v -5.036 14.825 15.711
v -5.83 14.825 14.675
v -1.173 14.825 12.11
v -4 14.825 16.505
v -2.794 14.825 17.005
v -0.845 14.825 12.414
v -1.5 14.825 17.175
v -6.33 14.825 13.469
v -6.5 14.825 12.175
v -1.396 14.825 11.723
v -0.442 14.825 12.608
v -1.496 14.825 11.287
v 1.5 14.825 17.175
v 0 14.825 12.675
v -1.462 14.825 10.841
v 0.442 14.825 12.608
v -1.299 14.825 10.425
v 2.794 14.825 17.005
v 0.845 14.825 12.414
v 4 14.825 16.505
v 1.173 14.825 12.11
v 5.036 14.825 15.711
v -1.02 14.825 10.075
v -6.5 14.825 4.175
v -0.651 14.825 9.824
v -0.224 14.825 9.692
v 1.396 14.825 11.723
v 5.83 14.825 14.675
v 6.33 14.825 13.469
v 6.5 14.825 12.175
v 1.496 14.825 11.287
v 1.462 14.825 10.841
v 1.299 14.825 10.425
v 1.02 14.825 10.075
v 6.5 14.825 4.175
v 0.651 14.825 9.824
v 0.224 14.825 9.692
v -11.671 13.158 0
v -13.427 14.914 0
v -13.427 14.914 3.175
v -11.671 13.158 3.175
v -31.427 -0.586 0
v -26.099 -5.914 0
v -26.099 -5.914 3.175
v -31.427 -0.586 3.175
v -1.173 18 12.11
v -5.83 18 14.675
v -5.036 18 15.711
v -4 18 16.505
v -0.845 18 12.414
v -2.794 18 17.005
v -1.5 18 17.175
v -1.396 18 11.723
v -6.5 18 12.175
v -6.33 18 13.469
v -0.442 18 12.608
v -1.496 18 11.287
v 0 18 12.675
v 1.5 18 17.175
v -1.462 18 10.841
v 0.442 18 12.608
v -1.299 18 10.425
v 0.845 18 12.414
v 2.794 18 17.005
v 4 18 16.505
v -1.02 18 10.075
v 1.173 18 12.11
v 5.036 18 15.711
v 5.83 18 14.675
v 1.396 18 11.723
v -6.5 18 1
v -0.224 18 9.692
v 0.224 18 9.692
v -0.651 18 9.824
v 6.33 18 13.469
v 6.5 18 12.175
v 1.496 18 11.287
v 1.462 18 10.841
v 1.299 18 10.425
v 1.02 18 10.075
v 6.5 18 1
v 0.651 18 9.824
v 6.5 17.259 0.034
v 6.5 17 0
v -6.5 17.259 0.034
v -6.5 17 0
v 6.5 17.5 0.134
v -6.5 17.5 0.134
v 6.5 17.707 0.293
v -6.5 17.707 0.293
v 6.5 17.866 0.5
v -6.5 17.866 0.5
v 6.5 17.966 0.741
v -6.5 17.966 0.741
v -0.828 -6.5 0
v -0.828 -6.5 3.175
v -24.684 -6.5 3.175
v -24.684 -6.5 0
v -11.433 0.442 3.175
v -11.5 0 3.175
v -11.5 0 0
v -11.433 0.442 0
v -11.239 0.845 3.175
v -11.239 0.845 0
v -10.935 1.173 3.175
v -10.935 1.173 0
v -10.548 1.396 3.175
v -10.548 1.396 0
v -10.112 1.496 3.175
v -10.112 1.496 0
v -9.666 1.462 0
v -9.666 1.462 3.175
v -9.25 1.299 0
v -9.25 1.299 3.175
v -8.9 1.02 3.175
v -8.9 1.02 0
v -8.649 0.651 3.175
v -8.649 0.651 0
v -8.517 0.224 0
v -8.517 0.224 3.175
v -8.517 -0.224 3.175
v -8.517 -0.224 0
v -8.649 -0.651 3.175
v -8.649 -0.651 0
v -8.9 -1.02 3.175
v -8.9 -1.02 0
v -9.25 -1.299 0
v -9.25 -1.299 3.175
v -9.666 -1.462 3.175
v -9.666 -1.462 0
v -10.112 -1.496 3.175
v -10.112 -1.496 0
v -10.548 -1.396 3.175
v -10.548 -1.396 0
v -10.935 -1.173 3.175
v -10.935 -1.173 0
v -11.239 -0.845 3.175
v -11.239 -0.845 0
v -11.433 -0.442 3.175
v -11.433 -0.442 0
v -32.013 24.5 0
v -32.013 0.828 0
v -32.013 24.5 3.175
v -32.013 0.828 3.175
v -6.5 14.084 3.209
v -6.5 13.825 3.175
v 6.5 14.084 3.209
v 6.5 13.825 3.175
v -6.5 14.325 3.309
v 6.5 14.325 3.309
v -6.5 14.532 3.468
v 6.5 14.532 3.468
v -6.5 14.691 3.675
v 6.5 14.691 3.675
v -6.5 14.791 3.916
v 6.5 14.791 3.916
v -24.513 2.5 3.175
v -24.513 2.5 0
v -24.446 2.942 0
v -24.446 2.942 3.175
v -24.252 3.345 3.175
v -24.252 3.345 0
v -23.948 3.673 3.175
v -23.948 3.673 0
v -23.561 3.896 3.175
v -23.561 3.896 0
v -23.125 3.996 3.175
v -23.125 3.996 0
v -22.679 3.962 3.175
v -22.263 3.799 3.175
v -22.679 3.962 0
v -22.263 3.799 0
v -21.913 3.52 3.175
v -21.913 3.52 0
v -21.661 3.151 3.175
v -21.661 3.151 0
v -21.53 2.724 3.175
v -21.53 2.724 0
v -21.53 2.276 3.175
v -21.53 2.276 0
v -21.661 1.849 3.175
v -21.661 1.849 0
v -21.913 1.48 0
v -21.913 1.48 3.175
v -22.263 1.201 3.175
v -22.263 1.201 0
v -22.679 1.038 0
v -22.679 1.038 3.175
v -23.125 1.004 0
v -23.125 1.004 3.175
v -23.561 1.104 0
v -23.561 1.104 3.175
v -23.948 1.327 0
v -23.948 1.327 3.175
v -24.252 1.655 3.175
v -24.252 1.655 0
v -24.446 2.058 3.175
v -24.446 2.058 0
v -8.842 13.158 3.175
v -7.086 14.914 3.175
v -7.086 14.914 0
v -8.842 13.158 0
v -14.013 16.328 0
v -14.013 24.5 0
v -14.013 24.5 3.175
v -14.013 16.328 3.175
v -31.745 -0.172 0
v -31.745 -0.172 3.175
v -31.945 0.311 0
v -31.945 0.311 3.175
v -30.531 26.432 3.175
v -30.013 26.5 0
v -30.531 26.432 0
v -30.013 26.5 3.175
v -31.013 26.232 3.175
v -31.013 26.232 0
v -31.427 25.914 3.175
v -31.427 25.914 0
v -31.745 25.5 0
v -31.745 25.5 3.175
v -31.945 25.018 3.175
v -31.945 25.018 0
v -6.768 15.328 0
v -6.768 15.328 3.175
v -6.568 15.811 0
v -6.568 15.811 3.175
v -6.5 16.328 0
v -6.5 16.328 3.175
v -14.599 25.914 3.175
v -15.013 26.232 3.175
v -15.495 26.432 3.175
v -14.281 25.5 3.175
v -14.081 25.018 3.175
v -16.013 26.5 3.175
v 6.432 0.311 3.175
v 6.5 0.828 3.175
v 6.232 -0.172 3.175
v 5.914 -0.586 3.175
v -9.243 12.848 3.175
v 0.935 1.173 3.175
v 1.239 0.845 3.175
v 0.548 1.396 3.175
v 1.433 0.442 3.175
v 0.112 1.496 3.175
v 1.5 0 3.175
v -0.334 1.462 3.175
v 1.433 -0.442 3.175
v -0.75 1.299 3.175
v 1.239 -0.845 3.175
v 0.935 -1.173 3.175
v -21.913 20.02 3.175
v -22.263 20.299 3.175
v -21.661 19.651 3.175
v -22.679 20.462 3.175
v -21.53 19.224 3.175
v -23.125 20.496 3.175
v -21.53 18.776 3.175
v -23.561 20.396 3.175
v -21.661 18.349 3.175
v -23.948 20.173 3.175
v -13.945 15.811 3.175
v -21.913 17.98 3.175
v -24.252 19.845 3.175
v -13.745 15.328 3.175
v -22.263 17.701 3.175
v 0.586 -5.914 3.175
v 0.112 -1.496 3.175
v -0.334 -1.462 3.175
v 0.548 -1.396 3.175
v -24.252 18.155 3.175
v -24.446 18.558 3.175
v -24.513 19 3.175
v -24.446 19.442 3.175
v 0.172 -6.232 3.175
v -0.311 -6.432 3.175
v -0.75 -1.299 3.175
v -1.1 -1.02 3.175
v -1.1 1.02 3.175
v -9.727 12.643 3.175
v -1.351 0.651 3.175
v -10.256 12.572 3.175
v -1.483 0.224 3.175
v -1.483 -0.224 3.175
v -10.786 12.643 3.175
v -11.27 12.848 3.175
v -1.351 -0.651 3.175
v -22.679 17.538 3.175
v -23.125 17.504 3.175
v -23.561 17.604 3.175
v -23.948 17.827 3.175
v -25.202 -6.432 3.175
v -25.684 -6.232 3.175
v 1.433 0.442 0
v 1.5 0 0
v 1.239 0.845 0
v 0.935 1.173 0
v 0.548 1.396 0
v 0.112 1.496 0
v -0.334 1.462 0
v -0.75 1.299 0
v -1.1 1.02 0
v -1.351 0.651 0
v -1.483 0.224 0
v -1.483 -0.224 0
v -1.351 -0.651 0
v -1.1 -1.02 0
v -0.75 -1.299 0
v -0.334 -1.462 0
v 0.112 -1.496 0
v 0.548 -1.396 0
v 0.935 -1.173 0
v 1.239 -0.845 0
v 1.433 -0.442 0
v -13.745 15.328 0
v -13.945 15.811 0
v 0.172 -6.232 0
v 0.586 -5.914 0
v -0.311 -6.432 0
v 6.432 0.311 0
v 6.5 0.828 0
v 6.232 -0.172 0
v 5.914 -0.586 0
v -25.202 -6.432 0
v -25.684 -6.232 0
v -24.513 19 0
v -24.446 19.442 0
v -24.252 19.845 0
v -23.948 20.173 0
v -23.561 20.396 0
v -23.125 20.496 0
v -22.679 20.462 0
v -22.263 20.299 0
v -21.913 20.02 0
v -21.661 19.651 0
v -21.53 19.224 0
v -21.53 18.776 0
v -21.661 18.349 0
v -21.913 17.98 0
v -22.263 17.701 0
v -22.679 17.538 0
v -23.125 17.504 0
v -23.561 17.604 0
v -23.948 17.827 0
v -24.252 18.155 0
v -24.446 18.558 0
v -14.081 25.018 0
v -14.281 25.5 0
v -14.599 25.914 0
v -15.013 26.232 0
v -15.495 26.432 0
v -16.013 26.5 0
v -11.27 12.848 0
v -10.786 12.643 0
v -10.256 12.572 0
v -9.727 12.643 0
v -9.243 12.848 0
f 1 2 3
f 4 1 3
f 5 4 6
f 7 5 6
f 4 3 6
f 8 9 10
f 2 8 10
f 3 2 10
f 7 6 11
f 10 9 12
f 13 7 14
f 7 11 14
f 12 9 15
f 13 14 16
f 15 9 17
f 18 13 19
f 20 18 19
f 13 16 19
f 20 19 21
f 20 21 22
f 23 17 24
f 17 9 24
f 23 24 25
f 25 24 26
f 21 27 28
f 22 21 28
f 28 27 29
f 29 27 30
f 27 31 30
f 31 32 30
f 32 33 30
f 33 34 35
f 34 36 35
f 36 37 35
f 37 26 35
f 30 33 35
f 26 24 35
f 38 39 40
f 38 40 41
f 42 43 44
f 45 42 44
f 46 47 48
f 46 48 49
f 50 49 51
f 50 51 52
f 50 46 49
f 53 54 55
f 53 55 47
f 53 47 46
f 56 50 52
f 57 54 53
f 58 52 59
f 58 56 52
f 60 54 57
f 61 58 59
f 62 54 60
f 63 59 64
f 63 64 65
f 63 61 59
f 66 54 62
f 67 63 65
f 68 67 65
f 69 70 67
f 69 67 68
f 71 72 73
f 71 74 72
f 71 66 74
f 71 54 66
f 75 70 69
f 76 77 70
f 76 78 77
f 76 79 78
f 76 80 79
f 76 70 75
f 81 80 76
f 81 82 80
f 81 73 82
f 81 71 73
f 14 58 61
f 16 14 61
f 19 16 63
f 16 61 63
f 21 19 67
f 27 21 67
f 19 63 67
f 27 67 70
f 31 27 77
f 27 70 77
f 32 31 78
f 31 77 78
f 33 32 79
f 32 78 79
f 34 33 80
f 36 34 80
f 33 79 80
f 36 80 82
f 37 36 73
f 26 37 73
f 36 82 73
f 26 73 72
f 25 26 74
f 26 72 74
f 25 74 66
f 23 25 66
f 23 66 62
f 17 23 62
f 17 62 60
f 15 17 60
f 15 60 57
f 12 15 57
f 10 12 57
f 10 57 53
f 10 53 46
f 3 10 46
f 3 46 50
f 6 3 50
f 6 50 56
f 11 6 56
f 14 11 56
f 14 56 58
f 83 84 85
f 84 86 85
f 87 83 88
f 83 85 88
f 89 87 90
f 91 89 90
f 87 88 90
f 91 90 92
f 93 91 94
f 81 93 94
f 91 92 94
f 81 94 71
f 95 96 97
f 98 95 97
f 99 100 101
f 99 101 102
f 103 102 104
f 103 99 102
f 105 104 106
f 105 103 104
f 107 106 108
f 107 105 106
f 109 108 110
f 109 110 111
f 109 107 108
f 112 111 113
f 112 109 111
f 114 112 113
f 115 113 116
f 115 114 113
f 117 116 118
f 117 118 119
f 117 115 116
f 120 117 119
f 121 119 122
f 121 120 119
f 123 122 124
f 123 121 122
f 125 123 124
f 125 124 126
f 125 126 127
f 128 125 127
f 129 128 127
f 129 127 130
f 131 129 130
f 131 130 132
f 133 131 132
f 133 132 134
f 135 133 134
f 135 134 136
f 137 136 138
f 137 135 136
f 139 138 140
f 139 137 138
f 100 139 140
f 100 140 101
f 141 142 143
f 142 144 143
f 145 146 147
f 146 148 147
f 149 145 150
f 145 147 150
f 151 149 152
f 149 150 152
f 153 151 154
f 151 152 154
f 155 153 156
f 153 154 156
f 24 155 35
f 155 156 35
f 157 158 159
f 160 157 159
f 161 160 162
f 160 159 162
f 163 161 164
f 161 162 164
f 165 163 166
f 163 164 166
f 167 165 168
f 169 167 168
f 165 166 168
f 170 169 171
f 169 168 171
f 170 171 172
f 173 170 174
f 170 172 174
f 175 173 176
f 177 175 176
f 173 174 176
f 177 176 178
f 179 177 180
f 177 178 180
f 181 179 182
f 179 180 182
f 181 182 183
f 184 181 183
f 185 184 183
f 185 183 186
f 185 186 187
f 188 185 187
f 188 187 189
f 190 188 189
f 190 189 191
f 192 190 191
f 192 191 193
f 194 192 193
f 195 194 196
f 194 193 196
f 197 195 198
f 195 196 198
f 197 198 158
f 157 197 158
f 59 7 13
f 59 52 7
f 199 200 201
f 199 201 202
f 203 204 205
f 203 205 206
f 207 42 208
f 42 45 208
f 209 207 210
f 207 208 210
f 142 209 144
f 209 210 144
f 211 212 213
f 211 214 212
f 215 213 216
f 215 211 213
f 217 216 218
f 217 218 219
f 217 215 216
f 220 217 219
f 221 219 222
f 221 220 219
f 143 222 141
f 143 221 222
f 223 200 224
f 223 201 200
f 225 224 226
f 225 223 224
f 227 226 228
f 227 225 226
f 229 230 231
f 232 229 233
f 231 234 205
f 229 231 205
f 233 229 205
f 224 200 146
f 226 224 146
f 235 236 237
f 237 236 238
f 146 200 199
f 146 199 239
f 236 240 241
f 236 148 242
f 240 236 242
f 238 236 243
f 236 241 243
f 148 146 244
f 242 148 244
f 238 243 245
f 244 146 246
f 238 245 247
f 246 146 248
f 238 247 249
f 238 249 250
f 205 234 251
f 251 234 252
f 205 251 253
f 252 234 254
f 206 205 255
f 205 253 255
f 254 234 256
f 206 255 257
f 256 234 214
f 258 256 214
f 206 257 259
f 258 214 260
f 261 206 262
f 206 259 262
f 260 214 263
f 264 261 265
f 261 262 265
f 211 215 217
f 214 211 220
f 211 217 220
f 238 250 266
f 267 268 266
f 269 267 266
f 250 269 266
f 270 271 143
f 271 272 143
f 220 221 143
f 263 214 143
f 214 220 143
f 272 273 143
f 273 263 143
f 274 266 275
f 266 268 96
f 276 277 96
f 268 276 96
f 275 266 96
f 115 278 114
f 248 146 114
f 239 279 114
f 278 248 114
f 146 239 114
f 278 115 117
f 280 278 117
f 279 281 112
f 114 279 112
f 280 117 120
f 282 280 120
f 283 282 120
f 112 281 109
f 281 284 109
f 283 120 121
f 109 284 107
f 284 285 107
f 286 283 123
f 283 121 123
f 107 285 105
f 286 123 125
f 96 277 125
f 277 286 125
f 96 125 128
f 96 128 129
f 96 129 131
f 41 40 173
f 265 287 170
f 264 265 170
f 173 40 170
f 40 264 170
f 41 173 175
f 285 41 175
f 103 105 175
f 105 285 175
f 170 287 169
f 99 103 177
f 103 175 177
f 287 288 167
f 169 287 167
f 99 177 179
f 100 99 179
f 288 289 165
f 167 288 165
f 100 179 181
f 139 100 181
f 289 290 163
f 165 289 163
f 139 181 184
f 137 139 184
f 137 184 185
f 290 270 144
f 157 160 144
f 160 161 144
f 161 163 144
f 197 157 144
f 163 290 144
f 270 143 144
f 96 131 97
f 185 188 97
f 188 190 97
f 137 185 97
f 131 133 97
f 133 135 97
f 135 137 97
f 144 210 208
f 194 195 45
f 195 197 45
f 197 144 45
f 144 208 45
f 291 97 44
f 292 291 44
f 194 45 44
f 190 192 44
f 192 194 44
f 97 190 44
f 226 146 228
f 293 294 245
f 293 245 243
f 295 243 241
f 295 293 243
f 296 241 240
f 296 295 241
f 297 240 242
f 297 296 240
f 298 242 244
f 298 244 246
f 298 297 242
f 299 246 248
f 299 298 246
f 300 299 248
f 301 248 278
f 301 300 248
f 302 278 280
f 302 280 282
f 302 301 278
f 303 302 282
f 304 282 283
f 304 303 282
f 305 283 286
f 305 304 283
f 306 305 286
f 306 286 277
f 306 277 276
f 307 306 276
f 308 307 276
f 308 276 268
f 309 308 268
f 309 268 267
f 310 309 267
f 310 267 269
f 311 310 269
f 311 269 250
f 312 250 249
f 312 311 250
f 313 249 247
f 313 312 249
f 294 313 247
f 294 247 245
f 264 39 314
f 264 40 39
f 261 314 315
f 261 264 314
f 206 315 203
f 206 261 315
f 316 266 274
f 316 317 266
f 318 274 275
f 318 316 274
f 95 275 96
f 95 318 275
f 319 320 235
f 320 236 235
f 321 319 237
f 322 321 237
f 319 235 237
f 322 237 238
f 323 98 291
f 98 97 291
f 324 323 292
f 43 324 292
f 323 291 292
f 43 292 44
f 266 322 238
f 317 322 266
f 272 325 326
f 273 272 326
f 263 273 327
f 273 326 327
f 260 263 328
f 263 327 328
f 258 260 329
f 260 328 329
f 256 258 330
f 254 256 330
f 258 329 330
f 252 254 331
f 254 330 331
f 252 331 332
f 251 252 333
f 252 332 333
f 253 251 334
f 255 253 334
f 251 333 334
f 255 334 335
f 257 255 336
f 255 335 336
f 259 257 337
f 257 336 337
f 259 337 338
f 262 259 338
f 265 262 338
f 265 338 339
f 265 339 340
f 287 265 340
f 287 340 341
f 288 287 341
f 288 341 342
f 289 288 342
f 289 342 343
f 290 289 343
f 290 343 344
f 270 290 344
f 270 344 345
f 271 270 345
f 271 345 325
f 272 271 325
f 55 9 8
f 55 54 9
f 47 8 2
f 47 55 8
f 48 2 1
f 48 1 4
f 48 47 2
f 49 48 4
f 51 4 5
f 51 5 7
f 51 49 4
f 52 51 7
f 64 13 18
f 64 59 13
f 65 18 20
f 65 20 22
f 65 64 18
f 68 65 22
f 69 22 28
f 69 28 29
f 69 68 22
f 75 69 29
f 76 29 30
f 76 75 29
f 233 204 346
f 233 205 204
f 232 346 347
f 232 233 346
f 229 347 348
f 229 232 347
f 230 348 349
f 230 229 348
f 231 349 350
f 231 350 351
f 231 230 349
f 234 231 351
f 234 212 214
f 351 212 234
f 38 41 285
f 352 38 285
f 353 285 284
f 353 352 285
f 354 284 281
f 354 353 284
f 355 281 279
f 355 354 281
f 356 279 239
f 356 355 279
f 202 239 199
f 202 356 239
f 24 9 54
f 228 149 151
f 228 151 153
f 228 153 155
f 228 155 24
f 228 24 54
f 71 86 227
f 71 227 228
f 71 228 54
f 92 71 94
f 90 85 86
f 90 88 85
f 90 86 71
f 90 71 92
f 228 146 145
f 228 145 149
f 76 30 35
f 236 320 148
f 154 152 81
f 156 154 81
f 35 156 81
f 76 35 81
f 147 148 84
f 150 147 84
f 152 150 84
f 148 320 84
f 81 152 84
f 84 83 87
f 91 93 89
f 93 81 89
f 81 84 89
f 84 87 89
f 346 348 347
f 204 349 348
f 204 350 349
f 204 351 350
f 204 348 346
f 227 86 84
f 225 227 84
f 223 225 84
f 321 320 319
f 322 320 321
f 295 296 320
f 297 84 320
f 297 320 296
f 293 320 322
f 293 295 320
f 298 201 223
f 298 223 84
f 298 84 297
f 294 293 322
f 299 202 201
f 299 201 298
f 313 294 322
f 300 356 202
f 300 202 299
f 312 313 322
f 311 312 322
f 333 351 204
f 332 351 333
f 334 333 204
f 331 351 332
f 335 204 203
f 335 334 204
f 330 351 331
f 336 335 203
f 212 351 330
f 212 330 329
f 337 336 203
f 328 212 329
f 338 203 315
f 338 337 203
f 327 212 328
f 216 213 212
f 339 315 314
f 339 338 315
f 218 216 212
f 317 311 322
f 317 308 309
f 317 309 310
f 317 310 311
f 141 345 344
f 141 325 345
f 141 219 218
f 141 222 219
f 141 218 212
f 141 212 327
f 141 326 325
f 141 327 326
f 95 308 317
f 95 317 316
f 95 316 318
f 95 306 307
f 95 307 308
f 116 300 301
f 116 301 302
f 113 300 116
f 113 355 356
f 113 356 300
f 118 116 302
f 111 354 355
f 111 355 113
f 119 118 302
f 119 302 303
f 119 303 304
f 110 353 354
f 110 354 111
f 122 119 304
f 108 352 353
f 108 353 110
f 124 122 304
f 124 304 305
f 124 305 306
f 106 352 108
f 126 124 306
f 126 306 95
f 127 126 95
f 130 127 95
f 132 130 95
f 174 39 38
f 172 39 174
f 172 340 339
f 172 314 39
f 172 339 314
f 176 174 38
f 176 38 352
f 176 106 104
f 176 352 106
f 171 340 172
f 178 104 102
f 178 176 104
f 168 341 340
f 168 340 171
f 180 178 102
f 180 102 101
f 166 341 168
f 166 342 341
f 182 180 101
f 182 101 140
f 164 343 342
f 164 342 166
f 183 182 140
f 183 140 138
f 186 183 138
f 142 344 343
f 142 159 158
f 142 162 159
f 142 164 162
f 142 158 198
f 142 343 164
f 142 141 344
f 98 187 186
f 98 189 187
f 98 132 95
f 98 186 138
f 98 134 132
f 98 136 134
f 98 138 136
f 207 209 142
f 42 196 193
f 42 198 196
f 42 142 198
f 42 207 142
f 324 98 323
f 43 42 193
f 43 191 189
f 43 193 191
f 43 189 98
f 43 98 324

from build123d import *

# Parameters (mm, degrees)
SKETCH1_R               = 6.5
SKETCH1_R_2             = 1.5
BOSS_EXTRUDE1_DEPTH     = 3.175
SKETCH2_W               = 13
SKETCH2_H               = 3.175
BOSS_EXTRUDE2_DEPTH     = 14
SKETCH3_R               = 1.5
CUT_EXTRUDE1_DEPTH      = 18
FILLET1_R               = 5
BOSS_EXTRUDE3_START     = -3.175
BOSS_EXTRUDE3_OUTLINE_R = 1.5
BOSS_EXTRUDE3_DEPTH     = 3.175
FILLET3_R               = 1
BOSS_EXTRUDE4_START     = -3.175
BOSS_EXTRUDE4_DEPTH     = 3.175
SKETCH6_R               = 1.5
CUT_EXTRUDE2_DEPTH      = 3.175
CHAMFER1_SIZE           = 4
FILLET4_R               = 2
CUT_EXTRUDE3_DEPTH      = 10
FILLET5_R               = 2
SKETCH8_R               = 1.5
BOSS_EXTRUDE5_DEPTH     = 3.175
CHAMFER2_SIZE           = 4
FILLET6_R               = 2
SKETCH9_R               = 1.5
CUT_EXTRUDE4_DEPTH      = 10
SKETCH9_3_W             = 16.093211202
SKETCH9_3_H             = 15.71695658
SKETCH9_3_R             = 1.5
SKETCH9_3_W_2           = 4.964902022
SKETCH9_3_H_2           = 7.25050354
BOSS_EXTRUDE6_DEPTH     = 3.175
CHAMFER3_SIZE           = 6.5
FILLET7_R               = 2


# Read off the part's stored shape, not the designer's step: Boss-Extrude3
with BuildPart() as part:
    # Sketch1 → Boss-Extrude1 (new body)
    # profile 1 of 2: a face of its own
    with BuildSketch(Plane.XY):
        Circle(SKETCH1_R)
        Circle(SKETCH1_R_2, mode=Mode.SUBTRACT)
    # profile 2 of 2: a face of its own
    with BuildSketch(Plane.XY):
        with BuildLine():
            Line((-6.5, 18), (-6.5, 0))
            ThreePointArc((-6.5, 0), (0, 6.5), (6.5, 0))
            Line((6.5, 0), (6.5, 18))
            Line((6.5, 18), (-6.5, 18))
        make_face()
    extrude(amount=BOSS_EXTRUDE1_DEPTH)

    # Sketch2 → Boss-Extrude2 (add)
    with BuildSketch(Plane.XY.offset(3.175)):
        with Locations((0, 16.4125)):
            Rectangle(SKETCH2_W, SKETCH2_H)
    extrude(amount=BOSS_EXTRUDE2_DEPTH)

    # Sketch3 → Cut-Extrude1 (cut)
    with BuildSketch(Plane(origin=(0, 18, 0), x_dir=(1, 0, 0), z_dir=(0, 1, 0))):
        with Locations(Location((0, -11.175, 0), (0, 0, 270))):
            Circle(SKETCH3_R)
    extrude(amount=-CUT_EXTRUDE1_DEPTH, mode=Mode.SUBTRACT)

    # Fillet1
    fillet1_edges = [part.edges().sort_by_distance(p)[0] for p in [
        (-6.5, 16.4125, 17.175),
        (6.5, 16.4125, 17.175),
    ]]
    fillet(fillet1_edges, radius=FILLET1_R)

    # Boss-Extrude3 outline → Boss-Extrude3 (add)
    with BuildSketch(Plane(origin=(0, 0, 0), x_dir=(-1, 0, 0), z_dir=(0, 0, -1)).offset(BOSS_EXTRUDE3_START)):
        with BuildLine():
            ThreePointArc((6.5, 0), (4.596194078, -4.596194078), (0, -6.5))
            Line((0, -6.5), (10, -6.5))
            ThreePointArc((10, -6.5), (16.239069091, 1.823188658), (6.5, 5.477225575))
            Line((6.5, 5.477225575), (6.5, 0))
        make_face()
        with Locations((10, 0)):
            Circle(BOSS_EXTRUDE3_OUTLINE_R, mode=Mode.SUBTRACT)
    extrude(amount=BOSS_EXTRUDE3_DEPTH)

    # Fillet3
    fillet3_edges = [part.edges().sort_by_distance(p)[0] for p in [
        (0, 14.825, 3.175),
        (0, 18, 0),
    ]]
    fillet(fillet3_edges, radius=FILLET3_R)

    # Sketch5 → Boss-Extrude4 (add)
    with BuildSketch(Plane(origin=(0, 0, 0), x_dir=(-1, 0, 0), z_dir=(0, 0, -1)).offset(BOSS_EXTRUDE4_START)):
        with BuildLine():
            Line((32.012922913, -6.5), (32.012922913, 11.5))
            Line((32.012922913, 11.5), (6.5, 11.5))
            Line((6.5, 11.5), (6.5, 5.477225575))
            ThreePointArc((6.5, 5.477225575), (16.239069091, 1.823188658), (10, -6.5))
            Line((10, -6.5), (32.012922913, -6.5))
        make_face()
    extrude(amount=BOSS_EXTRUDE4_DEPTH)

    # Sketch6 → Cut-Extrude2 (cut)
    with BuildSketch(Plane(origin=(0, 0, 0), x_dir=(-1, 0, 0), z_dir=(0, 0, -1))):
        with Locations((18.012922913, -2.5)):
            Circle(SKETCH6_R)
        with Locations((28.012922913, -2.5)):
            Circle(SKETCH6_R)
        with Locations((18.012922913, 7.5)):
            Circle(SKETCH6_R)
        with Locations((28.012922913, 7.5)):
            Circle(SKETCH6_R)
        with Locations((23.012922913, 2.5)):
            Circle(SKETCH6_R)
    extrude(amount=-CUT_EXTRUDE2_DEPTH, mode=Mode.SUBTRACT)

    # Chamfer1
    # the kernel refuses this chamfer: 4 mm, written as the material it adds along each edge
    with BuildSketch(Plane(origin=(-6.5, 11.5, 3.175), x_dir=(0.027495876610586053, 0.9996219169112968, 0), z_dir=(0, 0, -1))) as chamfer1_piece_1:
        Polygon((CHAMFER1_SIZE * 0.999621916911, -CHAMFER1_SIZE * 0.0274958766106), (-CHAMFER1_SIZE * 0.0274958766106, -CHAMFER1_SIZE * 0.999621916911), (0, 0), align=None)
    extrude(amount=3.175)

    # Fillet4
    fillet4_edges = [part.edges().sort_by_distance(p)[0] for p in [
        (-32.012922913, 11.5, 1.5875),
        (-32.012922913, -6.5, 1.5875),
    ]]
    fillet(fillet4_edges, radius=FILLET4_R)

    # Sketch7 → Cut-Extrude3 (cut)
    with BuildSketch(Plane(origin=(0, 0, 0), x_dir=(-1, 0, 0), z_dir=(0, 0, -1))):
        Polygon((-6.5, 0), (0, -6.5), (-6.5, -6.5), align=None)
    extrude(amount=-CUT_EXTRUDE3_DEPTH, mode=Mode.SUBTRACT)

    # Fillet5
    fillet5_edges = [part.edges().sort_by_distance(p)[0] for p in [
        (6.5, 0, 1.5875),
        (-10.5, 11.5, 1.5875),
        (-6.5, 15.5, 1.5875),
        (0, -6.5, 1.5875),
    ]]
    fillet(fillet5_edges, radius=FILLET5_R)

    # Sketch8 → Boss-Extrude5 (add)
    # profile 1 of 4: a face of its own
    with BuildSketch(Plane(origin=(0, 0, 0), x_dir=(-1, 0, 0), z_dir=(0, 0, -1))):
        with BuildLine():
            Line((14.012922913, 11.5), (14.012922913, -6.5))
            Line((14.012922913, -6.5), (30.012922913, -6.5))
            ThreePointArc((30.012922913, -6.5), (31.427136475, -5.914213562), (32.012922913, -4.5))
            Line((32.012922913, -4.5), (32.012922913, 9.5))
            ThreePointArc((32.012922913, 9.5), (31.427136475, 10.914213562), (30.012922913, 11.5))
            Line((30.012922913, 11.5), (14.012922913, 11.5))
        make_face()
        with Locations((18.012922913, -2.5)):
            Circle(SKETCH8_R, mode=Mode.SUBTRACT)
        with Locations((18.012922913, 7.5)):
            Circle(SKETCH8_R, mode=Mode.SUBTRACT)
        with Locations((23.012922913, 2.5)):
            Circle(SKETCH8_R, mode=Mode.SUBTRACT)
        with Locations((28.012922913, -2.5)):
            Circle(SKETCH8_R, mode=Mode.SUBTRACT)
        with Locations((28.012922913, 7.5)):
            Circle(SKETCH8_R, mode=Mode.SUBTRACT)
    # profile 2 of 4: a face of its own
    with BuildSketch(Plane(origin=(0, 0, 0), x_dir=(-1, 0, 0), z_dir=(0, 0, -1))):
        Polygon((14.012922913, 26.5), (14.012922913, 11.5), (30.012922913, 11.5), (32.012922913, 11.5), (32.012922913, 26.5), align=None)
    # profile 3 of 4: a face of its own
    with BuildSketch(Plane(origin=(0, 0, 0), x_dir=(-1, 0, 0), z_dir=(0, 0, -1))):
        with BuildLine():
            Line((32.012922913, 11.5), (30.012922913, 11.5))
            ThreePointArc((30.012922913, 11.5), (31.427136475, 10.914213562), (32.012922913, 9.5))
            Line((32.012922913, 9.5), (32.012922913, 11.5))
        make_face()
    # profile 4 of 4: a face of its own
    with BuildSketch(Plane(origin=(0, 0, 0), x_dir=(-1, 0, 0), z_dir=(0, 0, -1))):
        with BuildLine():
            ThreePointArc((32.012922913, -4.5), (31.427136475, -5.914213562), (30.012922913, -6.5))
            Line((30.012922913, -6.5), (32.012922913, -6.5))
            Line((32.012922913, -6.5), (32.012922913, -4.5))
        make_face()
    extrude(amount=-BOSS_EXTRUDE5_DEPTH)

    # Chamfer2
    # the kernel refuses this chamfer: 4 mm, written as the material it adds along each edge
    with BuildSketch(Plane(origin=(-14.012922913, 11.5, 0), x_dir=(-0.027495876610586053, 0.9996219169112968, 0), z_dir=(0, 0, 1))) as chamfer2_piece_1:
        Polygon((CHAMFER2_SIZE * 0.999621916911, -CHAMFER2_SIZE * 0.0274958766106), (-CHAMFER2_SIZE * 0.0274958766106, -CHAMFER2_SIZE * 0.999621916911), (0, 0), align=None)
    extrude(amount=3.175)

    # Fillet6
    fillet6_edges = [part.edges().sort_by_distance(p)[0] for p in [
        (-32.012922913, 26.5, 1.5875),
        (-14.012922913, 26.5, 1.5875),
        (-14.012922913, 15.5, 1.5875),
        (-10.298499236, 11.785576323, 1.5875),
    ]]
    fillet(fillet6_edges, radius=FILLET6_R)

    # Sketch9 → Cut-Extrude4 (cut)
    with BuildSketch(Plane(origin=(0, 0, 0), x_dir=(-1, 0, 0), z_dir=(0, 0, -1))):
        with Locations((23.012922913, 19)):
            Circle(SKETCH9_R)
    extrude(amount=-CUT_EXTRUDE4_DEPTH, mode=Mode.SUBTRACT)

    # Sketch9<3> → Boss-Extrude6 (add)
    # profile 1 of 5: a face of its own
    with BuildSketch(Plane(origin=(0, 0, 0), x_dir=(-1, 0, 0), z_dir=(0, 0, -1))):
        with Locations((23.012922913, 2.5)):
            Rectangle(SKETCH9_3_W, SKETCH9_3_H)
        with Locations((28.012922913, -2.5)):
            Circle(SKETCH9_3_R, mode=Mode.SUBTRACT)
        with Locations((18.012922913, 7.5)):
            Circle(SKETCH9_3_R, mode=Mode.SUBTRACT)
        with Locations((18.012922913, -2.5)):
            Circle(SKETCH9_3_R, mode=Mode.SUBTRACT)
        with Locations((28.012922913, 7.5)):
            Circle(SKETCH9_3_R, mode=Mode.SUBTRACT)
        with Locations((23.012922913, 2.5)):
            Rectangle(SKETCH9_3_W_2, SKETCH9_3_H_2, mode=Mode.SUBTRACT)
    # profile 2 of 5: a face of its own
    with BuildSketch(Plane(origin=(0, 0, 0), x_dir=(-1, 0, 0), z_dir=(0, 0, -1))):
        with Locations((28.012922913, -2.5)):
            Circle(SKETCH9_3_R)
    # profile 3 of 5: a face of its own
    with BuildSketch(Plane(origin=(0, 0, 0), x_dir=(-1, 0, 0), z_dir=(0, 0, -1))):
        with Locations((28.012922913, 7.5)):
            Circle(SKETCH9_3_R)
    # profile 4 of 5: a face of its own
    with BuildSketch(Plane(origin=(0, 0, 0), x_dir=(-1, 0, 0), z_dir=(0, 0, -1))):
        with Locations((18.012922913, 7.5)):
            Circle(SKETCH9_3_R)
    # profile 5 of 5: a face of its own
    with BuildSketch(Plane(origin=(0, 0, 0), x_dir=(-1, 0, 0), z_dir=(0, 0, -1))):
        with Locations((18.012922913, -2.5)):
            Circle(SKETCH9_3_R)
    extrude(amount=-BOSS_EXTRUDE6_DEPTH)

    # Chamfer3
    chamfer3_edges = [part.edges().sort_by_distance(p)[0] for p in [
        (-32.012922913, -6.5, 1.5875),
    ]]
    chamfer(chamfer3_edges, length=CHAMFER3_SIZE)

    # Fillet7
    fillet7_edges = [part.edges().sort_by_distance(p)[0] for p in [
        (-25.512922913, -6.5, 1.5875),
        (-32.012922913, 0, 1.5875),
    ]]
    fillet(fillet7_edges, radius=FILLET7_R)


solid = part.part
